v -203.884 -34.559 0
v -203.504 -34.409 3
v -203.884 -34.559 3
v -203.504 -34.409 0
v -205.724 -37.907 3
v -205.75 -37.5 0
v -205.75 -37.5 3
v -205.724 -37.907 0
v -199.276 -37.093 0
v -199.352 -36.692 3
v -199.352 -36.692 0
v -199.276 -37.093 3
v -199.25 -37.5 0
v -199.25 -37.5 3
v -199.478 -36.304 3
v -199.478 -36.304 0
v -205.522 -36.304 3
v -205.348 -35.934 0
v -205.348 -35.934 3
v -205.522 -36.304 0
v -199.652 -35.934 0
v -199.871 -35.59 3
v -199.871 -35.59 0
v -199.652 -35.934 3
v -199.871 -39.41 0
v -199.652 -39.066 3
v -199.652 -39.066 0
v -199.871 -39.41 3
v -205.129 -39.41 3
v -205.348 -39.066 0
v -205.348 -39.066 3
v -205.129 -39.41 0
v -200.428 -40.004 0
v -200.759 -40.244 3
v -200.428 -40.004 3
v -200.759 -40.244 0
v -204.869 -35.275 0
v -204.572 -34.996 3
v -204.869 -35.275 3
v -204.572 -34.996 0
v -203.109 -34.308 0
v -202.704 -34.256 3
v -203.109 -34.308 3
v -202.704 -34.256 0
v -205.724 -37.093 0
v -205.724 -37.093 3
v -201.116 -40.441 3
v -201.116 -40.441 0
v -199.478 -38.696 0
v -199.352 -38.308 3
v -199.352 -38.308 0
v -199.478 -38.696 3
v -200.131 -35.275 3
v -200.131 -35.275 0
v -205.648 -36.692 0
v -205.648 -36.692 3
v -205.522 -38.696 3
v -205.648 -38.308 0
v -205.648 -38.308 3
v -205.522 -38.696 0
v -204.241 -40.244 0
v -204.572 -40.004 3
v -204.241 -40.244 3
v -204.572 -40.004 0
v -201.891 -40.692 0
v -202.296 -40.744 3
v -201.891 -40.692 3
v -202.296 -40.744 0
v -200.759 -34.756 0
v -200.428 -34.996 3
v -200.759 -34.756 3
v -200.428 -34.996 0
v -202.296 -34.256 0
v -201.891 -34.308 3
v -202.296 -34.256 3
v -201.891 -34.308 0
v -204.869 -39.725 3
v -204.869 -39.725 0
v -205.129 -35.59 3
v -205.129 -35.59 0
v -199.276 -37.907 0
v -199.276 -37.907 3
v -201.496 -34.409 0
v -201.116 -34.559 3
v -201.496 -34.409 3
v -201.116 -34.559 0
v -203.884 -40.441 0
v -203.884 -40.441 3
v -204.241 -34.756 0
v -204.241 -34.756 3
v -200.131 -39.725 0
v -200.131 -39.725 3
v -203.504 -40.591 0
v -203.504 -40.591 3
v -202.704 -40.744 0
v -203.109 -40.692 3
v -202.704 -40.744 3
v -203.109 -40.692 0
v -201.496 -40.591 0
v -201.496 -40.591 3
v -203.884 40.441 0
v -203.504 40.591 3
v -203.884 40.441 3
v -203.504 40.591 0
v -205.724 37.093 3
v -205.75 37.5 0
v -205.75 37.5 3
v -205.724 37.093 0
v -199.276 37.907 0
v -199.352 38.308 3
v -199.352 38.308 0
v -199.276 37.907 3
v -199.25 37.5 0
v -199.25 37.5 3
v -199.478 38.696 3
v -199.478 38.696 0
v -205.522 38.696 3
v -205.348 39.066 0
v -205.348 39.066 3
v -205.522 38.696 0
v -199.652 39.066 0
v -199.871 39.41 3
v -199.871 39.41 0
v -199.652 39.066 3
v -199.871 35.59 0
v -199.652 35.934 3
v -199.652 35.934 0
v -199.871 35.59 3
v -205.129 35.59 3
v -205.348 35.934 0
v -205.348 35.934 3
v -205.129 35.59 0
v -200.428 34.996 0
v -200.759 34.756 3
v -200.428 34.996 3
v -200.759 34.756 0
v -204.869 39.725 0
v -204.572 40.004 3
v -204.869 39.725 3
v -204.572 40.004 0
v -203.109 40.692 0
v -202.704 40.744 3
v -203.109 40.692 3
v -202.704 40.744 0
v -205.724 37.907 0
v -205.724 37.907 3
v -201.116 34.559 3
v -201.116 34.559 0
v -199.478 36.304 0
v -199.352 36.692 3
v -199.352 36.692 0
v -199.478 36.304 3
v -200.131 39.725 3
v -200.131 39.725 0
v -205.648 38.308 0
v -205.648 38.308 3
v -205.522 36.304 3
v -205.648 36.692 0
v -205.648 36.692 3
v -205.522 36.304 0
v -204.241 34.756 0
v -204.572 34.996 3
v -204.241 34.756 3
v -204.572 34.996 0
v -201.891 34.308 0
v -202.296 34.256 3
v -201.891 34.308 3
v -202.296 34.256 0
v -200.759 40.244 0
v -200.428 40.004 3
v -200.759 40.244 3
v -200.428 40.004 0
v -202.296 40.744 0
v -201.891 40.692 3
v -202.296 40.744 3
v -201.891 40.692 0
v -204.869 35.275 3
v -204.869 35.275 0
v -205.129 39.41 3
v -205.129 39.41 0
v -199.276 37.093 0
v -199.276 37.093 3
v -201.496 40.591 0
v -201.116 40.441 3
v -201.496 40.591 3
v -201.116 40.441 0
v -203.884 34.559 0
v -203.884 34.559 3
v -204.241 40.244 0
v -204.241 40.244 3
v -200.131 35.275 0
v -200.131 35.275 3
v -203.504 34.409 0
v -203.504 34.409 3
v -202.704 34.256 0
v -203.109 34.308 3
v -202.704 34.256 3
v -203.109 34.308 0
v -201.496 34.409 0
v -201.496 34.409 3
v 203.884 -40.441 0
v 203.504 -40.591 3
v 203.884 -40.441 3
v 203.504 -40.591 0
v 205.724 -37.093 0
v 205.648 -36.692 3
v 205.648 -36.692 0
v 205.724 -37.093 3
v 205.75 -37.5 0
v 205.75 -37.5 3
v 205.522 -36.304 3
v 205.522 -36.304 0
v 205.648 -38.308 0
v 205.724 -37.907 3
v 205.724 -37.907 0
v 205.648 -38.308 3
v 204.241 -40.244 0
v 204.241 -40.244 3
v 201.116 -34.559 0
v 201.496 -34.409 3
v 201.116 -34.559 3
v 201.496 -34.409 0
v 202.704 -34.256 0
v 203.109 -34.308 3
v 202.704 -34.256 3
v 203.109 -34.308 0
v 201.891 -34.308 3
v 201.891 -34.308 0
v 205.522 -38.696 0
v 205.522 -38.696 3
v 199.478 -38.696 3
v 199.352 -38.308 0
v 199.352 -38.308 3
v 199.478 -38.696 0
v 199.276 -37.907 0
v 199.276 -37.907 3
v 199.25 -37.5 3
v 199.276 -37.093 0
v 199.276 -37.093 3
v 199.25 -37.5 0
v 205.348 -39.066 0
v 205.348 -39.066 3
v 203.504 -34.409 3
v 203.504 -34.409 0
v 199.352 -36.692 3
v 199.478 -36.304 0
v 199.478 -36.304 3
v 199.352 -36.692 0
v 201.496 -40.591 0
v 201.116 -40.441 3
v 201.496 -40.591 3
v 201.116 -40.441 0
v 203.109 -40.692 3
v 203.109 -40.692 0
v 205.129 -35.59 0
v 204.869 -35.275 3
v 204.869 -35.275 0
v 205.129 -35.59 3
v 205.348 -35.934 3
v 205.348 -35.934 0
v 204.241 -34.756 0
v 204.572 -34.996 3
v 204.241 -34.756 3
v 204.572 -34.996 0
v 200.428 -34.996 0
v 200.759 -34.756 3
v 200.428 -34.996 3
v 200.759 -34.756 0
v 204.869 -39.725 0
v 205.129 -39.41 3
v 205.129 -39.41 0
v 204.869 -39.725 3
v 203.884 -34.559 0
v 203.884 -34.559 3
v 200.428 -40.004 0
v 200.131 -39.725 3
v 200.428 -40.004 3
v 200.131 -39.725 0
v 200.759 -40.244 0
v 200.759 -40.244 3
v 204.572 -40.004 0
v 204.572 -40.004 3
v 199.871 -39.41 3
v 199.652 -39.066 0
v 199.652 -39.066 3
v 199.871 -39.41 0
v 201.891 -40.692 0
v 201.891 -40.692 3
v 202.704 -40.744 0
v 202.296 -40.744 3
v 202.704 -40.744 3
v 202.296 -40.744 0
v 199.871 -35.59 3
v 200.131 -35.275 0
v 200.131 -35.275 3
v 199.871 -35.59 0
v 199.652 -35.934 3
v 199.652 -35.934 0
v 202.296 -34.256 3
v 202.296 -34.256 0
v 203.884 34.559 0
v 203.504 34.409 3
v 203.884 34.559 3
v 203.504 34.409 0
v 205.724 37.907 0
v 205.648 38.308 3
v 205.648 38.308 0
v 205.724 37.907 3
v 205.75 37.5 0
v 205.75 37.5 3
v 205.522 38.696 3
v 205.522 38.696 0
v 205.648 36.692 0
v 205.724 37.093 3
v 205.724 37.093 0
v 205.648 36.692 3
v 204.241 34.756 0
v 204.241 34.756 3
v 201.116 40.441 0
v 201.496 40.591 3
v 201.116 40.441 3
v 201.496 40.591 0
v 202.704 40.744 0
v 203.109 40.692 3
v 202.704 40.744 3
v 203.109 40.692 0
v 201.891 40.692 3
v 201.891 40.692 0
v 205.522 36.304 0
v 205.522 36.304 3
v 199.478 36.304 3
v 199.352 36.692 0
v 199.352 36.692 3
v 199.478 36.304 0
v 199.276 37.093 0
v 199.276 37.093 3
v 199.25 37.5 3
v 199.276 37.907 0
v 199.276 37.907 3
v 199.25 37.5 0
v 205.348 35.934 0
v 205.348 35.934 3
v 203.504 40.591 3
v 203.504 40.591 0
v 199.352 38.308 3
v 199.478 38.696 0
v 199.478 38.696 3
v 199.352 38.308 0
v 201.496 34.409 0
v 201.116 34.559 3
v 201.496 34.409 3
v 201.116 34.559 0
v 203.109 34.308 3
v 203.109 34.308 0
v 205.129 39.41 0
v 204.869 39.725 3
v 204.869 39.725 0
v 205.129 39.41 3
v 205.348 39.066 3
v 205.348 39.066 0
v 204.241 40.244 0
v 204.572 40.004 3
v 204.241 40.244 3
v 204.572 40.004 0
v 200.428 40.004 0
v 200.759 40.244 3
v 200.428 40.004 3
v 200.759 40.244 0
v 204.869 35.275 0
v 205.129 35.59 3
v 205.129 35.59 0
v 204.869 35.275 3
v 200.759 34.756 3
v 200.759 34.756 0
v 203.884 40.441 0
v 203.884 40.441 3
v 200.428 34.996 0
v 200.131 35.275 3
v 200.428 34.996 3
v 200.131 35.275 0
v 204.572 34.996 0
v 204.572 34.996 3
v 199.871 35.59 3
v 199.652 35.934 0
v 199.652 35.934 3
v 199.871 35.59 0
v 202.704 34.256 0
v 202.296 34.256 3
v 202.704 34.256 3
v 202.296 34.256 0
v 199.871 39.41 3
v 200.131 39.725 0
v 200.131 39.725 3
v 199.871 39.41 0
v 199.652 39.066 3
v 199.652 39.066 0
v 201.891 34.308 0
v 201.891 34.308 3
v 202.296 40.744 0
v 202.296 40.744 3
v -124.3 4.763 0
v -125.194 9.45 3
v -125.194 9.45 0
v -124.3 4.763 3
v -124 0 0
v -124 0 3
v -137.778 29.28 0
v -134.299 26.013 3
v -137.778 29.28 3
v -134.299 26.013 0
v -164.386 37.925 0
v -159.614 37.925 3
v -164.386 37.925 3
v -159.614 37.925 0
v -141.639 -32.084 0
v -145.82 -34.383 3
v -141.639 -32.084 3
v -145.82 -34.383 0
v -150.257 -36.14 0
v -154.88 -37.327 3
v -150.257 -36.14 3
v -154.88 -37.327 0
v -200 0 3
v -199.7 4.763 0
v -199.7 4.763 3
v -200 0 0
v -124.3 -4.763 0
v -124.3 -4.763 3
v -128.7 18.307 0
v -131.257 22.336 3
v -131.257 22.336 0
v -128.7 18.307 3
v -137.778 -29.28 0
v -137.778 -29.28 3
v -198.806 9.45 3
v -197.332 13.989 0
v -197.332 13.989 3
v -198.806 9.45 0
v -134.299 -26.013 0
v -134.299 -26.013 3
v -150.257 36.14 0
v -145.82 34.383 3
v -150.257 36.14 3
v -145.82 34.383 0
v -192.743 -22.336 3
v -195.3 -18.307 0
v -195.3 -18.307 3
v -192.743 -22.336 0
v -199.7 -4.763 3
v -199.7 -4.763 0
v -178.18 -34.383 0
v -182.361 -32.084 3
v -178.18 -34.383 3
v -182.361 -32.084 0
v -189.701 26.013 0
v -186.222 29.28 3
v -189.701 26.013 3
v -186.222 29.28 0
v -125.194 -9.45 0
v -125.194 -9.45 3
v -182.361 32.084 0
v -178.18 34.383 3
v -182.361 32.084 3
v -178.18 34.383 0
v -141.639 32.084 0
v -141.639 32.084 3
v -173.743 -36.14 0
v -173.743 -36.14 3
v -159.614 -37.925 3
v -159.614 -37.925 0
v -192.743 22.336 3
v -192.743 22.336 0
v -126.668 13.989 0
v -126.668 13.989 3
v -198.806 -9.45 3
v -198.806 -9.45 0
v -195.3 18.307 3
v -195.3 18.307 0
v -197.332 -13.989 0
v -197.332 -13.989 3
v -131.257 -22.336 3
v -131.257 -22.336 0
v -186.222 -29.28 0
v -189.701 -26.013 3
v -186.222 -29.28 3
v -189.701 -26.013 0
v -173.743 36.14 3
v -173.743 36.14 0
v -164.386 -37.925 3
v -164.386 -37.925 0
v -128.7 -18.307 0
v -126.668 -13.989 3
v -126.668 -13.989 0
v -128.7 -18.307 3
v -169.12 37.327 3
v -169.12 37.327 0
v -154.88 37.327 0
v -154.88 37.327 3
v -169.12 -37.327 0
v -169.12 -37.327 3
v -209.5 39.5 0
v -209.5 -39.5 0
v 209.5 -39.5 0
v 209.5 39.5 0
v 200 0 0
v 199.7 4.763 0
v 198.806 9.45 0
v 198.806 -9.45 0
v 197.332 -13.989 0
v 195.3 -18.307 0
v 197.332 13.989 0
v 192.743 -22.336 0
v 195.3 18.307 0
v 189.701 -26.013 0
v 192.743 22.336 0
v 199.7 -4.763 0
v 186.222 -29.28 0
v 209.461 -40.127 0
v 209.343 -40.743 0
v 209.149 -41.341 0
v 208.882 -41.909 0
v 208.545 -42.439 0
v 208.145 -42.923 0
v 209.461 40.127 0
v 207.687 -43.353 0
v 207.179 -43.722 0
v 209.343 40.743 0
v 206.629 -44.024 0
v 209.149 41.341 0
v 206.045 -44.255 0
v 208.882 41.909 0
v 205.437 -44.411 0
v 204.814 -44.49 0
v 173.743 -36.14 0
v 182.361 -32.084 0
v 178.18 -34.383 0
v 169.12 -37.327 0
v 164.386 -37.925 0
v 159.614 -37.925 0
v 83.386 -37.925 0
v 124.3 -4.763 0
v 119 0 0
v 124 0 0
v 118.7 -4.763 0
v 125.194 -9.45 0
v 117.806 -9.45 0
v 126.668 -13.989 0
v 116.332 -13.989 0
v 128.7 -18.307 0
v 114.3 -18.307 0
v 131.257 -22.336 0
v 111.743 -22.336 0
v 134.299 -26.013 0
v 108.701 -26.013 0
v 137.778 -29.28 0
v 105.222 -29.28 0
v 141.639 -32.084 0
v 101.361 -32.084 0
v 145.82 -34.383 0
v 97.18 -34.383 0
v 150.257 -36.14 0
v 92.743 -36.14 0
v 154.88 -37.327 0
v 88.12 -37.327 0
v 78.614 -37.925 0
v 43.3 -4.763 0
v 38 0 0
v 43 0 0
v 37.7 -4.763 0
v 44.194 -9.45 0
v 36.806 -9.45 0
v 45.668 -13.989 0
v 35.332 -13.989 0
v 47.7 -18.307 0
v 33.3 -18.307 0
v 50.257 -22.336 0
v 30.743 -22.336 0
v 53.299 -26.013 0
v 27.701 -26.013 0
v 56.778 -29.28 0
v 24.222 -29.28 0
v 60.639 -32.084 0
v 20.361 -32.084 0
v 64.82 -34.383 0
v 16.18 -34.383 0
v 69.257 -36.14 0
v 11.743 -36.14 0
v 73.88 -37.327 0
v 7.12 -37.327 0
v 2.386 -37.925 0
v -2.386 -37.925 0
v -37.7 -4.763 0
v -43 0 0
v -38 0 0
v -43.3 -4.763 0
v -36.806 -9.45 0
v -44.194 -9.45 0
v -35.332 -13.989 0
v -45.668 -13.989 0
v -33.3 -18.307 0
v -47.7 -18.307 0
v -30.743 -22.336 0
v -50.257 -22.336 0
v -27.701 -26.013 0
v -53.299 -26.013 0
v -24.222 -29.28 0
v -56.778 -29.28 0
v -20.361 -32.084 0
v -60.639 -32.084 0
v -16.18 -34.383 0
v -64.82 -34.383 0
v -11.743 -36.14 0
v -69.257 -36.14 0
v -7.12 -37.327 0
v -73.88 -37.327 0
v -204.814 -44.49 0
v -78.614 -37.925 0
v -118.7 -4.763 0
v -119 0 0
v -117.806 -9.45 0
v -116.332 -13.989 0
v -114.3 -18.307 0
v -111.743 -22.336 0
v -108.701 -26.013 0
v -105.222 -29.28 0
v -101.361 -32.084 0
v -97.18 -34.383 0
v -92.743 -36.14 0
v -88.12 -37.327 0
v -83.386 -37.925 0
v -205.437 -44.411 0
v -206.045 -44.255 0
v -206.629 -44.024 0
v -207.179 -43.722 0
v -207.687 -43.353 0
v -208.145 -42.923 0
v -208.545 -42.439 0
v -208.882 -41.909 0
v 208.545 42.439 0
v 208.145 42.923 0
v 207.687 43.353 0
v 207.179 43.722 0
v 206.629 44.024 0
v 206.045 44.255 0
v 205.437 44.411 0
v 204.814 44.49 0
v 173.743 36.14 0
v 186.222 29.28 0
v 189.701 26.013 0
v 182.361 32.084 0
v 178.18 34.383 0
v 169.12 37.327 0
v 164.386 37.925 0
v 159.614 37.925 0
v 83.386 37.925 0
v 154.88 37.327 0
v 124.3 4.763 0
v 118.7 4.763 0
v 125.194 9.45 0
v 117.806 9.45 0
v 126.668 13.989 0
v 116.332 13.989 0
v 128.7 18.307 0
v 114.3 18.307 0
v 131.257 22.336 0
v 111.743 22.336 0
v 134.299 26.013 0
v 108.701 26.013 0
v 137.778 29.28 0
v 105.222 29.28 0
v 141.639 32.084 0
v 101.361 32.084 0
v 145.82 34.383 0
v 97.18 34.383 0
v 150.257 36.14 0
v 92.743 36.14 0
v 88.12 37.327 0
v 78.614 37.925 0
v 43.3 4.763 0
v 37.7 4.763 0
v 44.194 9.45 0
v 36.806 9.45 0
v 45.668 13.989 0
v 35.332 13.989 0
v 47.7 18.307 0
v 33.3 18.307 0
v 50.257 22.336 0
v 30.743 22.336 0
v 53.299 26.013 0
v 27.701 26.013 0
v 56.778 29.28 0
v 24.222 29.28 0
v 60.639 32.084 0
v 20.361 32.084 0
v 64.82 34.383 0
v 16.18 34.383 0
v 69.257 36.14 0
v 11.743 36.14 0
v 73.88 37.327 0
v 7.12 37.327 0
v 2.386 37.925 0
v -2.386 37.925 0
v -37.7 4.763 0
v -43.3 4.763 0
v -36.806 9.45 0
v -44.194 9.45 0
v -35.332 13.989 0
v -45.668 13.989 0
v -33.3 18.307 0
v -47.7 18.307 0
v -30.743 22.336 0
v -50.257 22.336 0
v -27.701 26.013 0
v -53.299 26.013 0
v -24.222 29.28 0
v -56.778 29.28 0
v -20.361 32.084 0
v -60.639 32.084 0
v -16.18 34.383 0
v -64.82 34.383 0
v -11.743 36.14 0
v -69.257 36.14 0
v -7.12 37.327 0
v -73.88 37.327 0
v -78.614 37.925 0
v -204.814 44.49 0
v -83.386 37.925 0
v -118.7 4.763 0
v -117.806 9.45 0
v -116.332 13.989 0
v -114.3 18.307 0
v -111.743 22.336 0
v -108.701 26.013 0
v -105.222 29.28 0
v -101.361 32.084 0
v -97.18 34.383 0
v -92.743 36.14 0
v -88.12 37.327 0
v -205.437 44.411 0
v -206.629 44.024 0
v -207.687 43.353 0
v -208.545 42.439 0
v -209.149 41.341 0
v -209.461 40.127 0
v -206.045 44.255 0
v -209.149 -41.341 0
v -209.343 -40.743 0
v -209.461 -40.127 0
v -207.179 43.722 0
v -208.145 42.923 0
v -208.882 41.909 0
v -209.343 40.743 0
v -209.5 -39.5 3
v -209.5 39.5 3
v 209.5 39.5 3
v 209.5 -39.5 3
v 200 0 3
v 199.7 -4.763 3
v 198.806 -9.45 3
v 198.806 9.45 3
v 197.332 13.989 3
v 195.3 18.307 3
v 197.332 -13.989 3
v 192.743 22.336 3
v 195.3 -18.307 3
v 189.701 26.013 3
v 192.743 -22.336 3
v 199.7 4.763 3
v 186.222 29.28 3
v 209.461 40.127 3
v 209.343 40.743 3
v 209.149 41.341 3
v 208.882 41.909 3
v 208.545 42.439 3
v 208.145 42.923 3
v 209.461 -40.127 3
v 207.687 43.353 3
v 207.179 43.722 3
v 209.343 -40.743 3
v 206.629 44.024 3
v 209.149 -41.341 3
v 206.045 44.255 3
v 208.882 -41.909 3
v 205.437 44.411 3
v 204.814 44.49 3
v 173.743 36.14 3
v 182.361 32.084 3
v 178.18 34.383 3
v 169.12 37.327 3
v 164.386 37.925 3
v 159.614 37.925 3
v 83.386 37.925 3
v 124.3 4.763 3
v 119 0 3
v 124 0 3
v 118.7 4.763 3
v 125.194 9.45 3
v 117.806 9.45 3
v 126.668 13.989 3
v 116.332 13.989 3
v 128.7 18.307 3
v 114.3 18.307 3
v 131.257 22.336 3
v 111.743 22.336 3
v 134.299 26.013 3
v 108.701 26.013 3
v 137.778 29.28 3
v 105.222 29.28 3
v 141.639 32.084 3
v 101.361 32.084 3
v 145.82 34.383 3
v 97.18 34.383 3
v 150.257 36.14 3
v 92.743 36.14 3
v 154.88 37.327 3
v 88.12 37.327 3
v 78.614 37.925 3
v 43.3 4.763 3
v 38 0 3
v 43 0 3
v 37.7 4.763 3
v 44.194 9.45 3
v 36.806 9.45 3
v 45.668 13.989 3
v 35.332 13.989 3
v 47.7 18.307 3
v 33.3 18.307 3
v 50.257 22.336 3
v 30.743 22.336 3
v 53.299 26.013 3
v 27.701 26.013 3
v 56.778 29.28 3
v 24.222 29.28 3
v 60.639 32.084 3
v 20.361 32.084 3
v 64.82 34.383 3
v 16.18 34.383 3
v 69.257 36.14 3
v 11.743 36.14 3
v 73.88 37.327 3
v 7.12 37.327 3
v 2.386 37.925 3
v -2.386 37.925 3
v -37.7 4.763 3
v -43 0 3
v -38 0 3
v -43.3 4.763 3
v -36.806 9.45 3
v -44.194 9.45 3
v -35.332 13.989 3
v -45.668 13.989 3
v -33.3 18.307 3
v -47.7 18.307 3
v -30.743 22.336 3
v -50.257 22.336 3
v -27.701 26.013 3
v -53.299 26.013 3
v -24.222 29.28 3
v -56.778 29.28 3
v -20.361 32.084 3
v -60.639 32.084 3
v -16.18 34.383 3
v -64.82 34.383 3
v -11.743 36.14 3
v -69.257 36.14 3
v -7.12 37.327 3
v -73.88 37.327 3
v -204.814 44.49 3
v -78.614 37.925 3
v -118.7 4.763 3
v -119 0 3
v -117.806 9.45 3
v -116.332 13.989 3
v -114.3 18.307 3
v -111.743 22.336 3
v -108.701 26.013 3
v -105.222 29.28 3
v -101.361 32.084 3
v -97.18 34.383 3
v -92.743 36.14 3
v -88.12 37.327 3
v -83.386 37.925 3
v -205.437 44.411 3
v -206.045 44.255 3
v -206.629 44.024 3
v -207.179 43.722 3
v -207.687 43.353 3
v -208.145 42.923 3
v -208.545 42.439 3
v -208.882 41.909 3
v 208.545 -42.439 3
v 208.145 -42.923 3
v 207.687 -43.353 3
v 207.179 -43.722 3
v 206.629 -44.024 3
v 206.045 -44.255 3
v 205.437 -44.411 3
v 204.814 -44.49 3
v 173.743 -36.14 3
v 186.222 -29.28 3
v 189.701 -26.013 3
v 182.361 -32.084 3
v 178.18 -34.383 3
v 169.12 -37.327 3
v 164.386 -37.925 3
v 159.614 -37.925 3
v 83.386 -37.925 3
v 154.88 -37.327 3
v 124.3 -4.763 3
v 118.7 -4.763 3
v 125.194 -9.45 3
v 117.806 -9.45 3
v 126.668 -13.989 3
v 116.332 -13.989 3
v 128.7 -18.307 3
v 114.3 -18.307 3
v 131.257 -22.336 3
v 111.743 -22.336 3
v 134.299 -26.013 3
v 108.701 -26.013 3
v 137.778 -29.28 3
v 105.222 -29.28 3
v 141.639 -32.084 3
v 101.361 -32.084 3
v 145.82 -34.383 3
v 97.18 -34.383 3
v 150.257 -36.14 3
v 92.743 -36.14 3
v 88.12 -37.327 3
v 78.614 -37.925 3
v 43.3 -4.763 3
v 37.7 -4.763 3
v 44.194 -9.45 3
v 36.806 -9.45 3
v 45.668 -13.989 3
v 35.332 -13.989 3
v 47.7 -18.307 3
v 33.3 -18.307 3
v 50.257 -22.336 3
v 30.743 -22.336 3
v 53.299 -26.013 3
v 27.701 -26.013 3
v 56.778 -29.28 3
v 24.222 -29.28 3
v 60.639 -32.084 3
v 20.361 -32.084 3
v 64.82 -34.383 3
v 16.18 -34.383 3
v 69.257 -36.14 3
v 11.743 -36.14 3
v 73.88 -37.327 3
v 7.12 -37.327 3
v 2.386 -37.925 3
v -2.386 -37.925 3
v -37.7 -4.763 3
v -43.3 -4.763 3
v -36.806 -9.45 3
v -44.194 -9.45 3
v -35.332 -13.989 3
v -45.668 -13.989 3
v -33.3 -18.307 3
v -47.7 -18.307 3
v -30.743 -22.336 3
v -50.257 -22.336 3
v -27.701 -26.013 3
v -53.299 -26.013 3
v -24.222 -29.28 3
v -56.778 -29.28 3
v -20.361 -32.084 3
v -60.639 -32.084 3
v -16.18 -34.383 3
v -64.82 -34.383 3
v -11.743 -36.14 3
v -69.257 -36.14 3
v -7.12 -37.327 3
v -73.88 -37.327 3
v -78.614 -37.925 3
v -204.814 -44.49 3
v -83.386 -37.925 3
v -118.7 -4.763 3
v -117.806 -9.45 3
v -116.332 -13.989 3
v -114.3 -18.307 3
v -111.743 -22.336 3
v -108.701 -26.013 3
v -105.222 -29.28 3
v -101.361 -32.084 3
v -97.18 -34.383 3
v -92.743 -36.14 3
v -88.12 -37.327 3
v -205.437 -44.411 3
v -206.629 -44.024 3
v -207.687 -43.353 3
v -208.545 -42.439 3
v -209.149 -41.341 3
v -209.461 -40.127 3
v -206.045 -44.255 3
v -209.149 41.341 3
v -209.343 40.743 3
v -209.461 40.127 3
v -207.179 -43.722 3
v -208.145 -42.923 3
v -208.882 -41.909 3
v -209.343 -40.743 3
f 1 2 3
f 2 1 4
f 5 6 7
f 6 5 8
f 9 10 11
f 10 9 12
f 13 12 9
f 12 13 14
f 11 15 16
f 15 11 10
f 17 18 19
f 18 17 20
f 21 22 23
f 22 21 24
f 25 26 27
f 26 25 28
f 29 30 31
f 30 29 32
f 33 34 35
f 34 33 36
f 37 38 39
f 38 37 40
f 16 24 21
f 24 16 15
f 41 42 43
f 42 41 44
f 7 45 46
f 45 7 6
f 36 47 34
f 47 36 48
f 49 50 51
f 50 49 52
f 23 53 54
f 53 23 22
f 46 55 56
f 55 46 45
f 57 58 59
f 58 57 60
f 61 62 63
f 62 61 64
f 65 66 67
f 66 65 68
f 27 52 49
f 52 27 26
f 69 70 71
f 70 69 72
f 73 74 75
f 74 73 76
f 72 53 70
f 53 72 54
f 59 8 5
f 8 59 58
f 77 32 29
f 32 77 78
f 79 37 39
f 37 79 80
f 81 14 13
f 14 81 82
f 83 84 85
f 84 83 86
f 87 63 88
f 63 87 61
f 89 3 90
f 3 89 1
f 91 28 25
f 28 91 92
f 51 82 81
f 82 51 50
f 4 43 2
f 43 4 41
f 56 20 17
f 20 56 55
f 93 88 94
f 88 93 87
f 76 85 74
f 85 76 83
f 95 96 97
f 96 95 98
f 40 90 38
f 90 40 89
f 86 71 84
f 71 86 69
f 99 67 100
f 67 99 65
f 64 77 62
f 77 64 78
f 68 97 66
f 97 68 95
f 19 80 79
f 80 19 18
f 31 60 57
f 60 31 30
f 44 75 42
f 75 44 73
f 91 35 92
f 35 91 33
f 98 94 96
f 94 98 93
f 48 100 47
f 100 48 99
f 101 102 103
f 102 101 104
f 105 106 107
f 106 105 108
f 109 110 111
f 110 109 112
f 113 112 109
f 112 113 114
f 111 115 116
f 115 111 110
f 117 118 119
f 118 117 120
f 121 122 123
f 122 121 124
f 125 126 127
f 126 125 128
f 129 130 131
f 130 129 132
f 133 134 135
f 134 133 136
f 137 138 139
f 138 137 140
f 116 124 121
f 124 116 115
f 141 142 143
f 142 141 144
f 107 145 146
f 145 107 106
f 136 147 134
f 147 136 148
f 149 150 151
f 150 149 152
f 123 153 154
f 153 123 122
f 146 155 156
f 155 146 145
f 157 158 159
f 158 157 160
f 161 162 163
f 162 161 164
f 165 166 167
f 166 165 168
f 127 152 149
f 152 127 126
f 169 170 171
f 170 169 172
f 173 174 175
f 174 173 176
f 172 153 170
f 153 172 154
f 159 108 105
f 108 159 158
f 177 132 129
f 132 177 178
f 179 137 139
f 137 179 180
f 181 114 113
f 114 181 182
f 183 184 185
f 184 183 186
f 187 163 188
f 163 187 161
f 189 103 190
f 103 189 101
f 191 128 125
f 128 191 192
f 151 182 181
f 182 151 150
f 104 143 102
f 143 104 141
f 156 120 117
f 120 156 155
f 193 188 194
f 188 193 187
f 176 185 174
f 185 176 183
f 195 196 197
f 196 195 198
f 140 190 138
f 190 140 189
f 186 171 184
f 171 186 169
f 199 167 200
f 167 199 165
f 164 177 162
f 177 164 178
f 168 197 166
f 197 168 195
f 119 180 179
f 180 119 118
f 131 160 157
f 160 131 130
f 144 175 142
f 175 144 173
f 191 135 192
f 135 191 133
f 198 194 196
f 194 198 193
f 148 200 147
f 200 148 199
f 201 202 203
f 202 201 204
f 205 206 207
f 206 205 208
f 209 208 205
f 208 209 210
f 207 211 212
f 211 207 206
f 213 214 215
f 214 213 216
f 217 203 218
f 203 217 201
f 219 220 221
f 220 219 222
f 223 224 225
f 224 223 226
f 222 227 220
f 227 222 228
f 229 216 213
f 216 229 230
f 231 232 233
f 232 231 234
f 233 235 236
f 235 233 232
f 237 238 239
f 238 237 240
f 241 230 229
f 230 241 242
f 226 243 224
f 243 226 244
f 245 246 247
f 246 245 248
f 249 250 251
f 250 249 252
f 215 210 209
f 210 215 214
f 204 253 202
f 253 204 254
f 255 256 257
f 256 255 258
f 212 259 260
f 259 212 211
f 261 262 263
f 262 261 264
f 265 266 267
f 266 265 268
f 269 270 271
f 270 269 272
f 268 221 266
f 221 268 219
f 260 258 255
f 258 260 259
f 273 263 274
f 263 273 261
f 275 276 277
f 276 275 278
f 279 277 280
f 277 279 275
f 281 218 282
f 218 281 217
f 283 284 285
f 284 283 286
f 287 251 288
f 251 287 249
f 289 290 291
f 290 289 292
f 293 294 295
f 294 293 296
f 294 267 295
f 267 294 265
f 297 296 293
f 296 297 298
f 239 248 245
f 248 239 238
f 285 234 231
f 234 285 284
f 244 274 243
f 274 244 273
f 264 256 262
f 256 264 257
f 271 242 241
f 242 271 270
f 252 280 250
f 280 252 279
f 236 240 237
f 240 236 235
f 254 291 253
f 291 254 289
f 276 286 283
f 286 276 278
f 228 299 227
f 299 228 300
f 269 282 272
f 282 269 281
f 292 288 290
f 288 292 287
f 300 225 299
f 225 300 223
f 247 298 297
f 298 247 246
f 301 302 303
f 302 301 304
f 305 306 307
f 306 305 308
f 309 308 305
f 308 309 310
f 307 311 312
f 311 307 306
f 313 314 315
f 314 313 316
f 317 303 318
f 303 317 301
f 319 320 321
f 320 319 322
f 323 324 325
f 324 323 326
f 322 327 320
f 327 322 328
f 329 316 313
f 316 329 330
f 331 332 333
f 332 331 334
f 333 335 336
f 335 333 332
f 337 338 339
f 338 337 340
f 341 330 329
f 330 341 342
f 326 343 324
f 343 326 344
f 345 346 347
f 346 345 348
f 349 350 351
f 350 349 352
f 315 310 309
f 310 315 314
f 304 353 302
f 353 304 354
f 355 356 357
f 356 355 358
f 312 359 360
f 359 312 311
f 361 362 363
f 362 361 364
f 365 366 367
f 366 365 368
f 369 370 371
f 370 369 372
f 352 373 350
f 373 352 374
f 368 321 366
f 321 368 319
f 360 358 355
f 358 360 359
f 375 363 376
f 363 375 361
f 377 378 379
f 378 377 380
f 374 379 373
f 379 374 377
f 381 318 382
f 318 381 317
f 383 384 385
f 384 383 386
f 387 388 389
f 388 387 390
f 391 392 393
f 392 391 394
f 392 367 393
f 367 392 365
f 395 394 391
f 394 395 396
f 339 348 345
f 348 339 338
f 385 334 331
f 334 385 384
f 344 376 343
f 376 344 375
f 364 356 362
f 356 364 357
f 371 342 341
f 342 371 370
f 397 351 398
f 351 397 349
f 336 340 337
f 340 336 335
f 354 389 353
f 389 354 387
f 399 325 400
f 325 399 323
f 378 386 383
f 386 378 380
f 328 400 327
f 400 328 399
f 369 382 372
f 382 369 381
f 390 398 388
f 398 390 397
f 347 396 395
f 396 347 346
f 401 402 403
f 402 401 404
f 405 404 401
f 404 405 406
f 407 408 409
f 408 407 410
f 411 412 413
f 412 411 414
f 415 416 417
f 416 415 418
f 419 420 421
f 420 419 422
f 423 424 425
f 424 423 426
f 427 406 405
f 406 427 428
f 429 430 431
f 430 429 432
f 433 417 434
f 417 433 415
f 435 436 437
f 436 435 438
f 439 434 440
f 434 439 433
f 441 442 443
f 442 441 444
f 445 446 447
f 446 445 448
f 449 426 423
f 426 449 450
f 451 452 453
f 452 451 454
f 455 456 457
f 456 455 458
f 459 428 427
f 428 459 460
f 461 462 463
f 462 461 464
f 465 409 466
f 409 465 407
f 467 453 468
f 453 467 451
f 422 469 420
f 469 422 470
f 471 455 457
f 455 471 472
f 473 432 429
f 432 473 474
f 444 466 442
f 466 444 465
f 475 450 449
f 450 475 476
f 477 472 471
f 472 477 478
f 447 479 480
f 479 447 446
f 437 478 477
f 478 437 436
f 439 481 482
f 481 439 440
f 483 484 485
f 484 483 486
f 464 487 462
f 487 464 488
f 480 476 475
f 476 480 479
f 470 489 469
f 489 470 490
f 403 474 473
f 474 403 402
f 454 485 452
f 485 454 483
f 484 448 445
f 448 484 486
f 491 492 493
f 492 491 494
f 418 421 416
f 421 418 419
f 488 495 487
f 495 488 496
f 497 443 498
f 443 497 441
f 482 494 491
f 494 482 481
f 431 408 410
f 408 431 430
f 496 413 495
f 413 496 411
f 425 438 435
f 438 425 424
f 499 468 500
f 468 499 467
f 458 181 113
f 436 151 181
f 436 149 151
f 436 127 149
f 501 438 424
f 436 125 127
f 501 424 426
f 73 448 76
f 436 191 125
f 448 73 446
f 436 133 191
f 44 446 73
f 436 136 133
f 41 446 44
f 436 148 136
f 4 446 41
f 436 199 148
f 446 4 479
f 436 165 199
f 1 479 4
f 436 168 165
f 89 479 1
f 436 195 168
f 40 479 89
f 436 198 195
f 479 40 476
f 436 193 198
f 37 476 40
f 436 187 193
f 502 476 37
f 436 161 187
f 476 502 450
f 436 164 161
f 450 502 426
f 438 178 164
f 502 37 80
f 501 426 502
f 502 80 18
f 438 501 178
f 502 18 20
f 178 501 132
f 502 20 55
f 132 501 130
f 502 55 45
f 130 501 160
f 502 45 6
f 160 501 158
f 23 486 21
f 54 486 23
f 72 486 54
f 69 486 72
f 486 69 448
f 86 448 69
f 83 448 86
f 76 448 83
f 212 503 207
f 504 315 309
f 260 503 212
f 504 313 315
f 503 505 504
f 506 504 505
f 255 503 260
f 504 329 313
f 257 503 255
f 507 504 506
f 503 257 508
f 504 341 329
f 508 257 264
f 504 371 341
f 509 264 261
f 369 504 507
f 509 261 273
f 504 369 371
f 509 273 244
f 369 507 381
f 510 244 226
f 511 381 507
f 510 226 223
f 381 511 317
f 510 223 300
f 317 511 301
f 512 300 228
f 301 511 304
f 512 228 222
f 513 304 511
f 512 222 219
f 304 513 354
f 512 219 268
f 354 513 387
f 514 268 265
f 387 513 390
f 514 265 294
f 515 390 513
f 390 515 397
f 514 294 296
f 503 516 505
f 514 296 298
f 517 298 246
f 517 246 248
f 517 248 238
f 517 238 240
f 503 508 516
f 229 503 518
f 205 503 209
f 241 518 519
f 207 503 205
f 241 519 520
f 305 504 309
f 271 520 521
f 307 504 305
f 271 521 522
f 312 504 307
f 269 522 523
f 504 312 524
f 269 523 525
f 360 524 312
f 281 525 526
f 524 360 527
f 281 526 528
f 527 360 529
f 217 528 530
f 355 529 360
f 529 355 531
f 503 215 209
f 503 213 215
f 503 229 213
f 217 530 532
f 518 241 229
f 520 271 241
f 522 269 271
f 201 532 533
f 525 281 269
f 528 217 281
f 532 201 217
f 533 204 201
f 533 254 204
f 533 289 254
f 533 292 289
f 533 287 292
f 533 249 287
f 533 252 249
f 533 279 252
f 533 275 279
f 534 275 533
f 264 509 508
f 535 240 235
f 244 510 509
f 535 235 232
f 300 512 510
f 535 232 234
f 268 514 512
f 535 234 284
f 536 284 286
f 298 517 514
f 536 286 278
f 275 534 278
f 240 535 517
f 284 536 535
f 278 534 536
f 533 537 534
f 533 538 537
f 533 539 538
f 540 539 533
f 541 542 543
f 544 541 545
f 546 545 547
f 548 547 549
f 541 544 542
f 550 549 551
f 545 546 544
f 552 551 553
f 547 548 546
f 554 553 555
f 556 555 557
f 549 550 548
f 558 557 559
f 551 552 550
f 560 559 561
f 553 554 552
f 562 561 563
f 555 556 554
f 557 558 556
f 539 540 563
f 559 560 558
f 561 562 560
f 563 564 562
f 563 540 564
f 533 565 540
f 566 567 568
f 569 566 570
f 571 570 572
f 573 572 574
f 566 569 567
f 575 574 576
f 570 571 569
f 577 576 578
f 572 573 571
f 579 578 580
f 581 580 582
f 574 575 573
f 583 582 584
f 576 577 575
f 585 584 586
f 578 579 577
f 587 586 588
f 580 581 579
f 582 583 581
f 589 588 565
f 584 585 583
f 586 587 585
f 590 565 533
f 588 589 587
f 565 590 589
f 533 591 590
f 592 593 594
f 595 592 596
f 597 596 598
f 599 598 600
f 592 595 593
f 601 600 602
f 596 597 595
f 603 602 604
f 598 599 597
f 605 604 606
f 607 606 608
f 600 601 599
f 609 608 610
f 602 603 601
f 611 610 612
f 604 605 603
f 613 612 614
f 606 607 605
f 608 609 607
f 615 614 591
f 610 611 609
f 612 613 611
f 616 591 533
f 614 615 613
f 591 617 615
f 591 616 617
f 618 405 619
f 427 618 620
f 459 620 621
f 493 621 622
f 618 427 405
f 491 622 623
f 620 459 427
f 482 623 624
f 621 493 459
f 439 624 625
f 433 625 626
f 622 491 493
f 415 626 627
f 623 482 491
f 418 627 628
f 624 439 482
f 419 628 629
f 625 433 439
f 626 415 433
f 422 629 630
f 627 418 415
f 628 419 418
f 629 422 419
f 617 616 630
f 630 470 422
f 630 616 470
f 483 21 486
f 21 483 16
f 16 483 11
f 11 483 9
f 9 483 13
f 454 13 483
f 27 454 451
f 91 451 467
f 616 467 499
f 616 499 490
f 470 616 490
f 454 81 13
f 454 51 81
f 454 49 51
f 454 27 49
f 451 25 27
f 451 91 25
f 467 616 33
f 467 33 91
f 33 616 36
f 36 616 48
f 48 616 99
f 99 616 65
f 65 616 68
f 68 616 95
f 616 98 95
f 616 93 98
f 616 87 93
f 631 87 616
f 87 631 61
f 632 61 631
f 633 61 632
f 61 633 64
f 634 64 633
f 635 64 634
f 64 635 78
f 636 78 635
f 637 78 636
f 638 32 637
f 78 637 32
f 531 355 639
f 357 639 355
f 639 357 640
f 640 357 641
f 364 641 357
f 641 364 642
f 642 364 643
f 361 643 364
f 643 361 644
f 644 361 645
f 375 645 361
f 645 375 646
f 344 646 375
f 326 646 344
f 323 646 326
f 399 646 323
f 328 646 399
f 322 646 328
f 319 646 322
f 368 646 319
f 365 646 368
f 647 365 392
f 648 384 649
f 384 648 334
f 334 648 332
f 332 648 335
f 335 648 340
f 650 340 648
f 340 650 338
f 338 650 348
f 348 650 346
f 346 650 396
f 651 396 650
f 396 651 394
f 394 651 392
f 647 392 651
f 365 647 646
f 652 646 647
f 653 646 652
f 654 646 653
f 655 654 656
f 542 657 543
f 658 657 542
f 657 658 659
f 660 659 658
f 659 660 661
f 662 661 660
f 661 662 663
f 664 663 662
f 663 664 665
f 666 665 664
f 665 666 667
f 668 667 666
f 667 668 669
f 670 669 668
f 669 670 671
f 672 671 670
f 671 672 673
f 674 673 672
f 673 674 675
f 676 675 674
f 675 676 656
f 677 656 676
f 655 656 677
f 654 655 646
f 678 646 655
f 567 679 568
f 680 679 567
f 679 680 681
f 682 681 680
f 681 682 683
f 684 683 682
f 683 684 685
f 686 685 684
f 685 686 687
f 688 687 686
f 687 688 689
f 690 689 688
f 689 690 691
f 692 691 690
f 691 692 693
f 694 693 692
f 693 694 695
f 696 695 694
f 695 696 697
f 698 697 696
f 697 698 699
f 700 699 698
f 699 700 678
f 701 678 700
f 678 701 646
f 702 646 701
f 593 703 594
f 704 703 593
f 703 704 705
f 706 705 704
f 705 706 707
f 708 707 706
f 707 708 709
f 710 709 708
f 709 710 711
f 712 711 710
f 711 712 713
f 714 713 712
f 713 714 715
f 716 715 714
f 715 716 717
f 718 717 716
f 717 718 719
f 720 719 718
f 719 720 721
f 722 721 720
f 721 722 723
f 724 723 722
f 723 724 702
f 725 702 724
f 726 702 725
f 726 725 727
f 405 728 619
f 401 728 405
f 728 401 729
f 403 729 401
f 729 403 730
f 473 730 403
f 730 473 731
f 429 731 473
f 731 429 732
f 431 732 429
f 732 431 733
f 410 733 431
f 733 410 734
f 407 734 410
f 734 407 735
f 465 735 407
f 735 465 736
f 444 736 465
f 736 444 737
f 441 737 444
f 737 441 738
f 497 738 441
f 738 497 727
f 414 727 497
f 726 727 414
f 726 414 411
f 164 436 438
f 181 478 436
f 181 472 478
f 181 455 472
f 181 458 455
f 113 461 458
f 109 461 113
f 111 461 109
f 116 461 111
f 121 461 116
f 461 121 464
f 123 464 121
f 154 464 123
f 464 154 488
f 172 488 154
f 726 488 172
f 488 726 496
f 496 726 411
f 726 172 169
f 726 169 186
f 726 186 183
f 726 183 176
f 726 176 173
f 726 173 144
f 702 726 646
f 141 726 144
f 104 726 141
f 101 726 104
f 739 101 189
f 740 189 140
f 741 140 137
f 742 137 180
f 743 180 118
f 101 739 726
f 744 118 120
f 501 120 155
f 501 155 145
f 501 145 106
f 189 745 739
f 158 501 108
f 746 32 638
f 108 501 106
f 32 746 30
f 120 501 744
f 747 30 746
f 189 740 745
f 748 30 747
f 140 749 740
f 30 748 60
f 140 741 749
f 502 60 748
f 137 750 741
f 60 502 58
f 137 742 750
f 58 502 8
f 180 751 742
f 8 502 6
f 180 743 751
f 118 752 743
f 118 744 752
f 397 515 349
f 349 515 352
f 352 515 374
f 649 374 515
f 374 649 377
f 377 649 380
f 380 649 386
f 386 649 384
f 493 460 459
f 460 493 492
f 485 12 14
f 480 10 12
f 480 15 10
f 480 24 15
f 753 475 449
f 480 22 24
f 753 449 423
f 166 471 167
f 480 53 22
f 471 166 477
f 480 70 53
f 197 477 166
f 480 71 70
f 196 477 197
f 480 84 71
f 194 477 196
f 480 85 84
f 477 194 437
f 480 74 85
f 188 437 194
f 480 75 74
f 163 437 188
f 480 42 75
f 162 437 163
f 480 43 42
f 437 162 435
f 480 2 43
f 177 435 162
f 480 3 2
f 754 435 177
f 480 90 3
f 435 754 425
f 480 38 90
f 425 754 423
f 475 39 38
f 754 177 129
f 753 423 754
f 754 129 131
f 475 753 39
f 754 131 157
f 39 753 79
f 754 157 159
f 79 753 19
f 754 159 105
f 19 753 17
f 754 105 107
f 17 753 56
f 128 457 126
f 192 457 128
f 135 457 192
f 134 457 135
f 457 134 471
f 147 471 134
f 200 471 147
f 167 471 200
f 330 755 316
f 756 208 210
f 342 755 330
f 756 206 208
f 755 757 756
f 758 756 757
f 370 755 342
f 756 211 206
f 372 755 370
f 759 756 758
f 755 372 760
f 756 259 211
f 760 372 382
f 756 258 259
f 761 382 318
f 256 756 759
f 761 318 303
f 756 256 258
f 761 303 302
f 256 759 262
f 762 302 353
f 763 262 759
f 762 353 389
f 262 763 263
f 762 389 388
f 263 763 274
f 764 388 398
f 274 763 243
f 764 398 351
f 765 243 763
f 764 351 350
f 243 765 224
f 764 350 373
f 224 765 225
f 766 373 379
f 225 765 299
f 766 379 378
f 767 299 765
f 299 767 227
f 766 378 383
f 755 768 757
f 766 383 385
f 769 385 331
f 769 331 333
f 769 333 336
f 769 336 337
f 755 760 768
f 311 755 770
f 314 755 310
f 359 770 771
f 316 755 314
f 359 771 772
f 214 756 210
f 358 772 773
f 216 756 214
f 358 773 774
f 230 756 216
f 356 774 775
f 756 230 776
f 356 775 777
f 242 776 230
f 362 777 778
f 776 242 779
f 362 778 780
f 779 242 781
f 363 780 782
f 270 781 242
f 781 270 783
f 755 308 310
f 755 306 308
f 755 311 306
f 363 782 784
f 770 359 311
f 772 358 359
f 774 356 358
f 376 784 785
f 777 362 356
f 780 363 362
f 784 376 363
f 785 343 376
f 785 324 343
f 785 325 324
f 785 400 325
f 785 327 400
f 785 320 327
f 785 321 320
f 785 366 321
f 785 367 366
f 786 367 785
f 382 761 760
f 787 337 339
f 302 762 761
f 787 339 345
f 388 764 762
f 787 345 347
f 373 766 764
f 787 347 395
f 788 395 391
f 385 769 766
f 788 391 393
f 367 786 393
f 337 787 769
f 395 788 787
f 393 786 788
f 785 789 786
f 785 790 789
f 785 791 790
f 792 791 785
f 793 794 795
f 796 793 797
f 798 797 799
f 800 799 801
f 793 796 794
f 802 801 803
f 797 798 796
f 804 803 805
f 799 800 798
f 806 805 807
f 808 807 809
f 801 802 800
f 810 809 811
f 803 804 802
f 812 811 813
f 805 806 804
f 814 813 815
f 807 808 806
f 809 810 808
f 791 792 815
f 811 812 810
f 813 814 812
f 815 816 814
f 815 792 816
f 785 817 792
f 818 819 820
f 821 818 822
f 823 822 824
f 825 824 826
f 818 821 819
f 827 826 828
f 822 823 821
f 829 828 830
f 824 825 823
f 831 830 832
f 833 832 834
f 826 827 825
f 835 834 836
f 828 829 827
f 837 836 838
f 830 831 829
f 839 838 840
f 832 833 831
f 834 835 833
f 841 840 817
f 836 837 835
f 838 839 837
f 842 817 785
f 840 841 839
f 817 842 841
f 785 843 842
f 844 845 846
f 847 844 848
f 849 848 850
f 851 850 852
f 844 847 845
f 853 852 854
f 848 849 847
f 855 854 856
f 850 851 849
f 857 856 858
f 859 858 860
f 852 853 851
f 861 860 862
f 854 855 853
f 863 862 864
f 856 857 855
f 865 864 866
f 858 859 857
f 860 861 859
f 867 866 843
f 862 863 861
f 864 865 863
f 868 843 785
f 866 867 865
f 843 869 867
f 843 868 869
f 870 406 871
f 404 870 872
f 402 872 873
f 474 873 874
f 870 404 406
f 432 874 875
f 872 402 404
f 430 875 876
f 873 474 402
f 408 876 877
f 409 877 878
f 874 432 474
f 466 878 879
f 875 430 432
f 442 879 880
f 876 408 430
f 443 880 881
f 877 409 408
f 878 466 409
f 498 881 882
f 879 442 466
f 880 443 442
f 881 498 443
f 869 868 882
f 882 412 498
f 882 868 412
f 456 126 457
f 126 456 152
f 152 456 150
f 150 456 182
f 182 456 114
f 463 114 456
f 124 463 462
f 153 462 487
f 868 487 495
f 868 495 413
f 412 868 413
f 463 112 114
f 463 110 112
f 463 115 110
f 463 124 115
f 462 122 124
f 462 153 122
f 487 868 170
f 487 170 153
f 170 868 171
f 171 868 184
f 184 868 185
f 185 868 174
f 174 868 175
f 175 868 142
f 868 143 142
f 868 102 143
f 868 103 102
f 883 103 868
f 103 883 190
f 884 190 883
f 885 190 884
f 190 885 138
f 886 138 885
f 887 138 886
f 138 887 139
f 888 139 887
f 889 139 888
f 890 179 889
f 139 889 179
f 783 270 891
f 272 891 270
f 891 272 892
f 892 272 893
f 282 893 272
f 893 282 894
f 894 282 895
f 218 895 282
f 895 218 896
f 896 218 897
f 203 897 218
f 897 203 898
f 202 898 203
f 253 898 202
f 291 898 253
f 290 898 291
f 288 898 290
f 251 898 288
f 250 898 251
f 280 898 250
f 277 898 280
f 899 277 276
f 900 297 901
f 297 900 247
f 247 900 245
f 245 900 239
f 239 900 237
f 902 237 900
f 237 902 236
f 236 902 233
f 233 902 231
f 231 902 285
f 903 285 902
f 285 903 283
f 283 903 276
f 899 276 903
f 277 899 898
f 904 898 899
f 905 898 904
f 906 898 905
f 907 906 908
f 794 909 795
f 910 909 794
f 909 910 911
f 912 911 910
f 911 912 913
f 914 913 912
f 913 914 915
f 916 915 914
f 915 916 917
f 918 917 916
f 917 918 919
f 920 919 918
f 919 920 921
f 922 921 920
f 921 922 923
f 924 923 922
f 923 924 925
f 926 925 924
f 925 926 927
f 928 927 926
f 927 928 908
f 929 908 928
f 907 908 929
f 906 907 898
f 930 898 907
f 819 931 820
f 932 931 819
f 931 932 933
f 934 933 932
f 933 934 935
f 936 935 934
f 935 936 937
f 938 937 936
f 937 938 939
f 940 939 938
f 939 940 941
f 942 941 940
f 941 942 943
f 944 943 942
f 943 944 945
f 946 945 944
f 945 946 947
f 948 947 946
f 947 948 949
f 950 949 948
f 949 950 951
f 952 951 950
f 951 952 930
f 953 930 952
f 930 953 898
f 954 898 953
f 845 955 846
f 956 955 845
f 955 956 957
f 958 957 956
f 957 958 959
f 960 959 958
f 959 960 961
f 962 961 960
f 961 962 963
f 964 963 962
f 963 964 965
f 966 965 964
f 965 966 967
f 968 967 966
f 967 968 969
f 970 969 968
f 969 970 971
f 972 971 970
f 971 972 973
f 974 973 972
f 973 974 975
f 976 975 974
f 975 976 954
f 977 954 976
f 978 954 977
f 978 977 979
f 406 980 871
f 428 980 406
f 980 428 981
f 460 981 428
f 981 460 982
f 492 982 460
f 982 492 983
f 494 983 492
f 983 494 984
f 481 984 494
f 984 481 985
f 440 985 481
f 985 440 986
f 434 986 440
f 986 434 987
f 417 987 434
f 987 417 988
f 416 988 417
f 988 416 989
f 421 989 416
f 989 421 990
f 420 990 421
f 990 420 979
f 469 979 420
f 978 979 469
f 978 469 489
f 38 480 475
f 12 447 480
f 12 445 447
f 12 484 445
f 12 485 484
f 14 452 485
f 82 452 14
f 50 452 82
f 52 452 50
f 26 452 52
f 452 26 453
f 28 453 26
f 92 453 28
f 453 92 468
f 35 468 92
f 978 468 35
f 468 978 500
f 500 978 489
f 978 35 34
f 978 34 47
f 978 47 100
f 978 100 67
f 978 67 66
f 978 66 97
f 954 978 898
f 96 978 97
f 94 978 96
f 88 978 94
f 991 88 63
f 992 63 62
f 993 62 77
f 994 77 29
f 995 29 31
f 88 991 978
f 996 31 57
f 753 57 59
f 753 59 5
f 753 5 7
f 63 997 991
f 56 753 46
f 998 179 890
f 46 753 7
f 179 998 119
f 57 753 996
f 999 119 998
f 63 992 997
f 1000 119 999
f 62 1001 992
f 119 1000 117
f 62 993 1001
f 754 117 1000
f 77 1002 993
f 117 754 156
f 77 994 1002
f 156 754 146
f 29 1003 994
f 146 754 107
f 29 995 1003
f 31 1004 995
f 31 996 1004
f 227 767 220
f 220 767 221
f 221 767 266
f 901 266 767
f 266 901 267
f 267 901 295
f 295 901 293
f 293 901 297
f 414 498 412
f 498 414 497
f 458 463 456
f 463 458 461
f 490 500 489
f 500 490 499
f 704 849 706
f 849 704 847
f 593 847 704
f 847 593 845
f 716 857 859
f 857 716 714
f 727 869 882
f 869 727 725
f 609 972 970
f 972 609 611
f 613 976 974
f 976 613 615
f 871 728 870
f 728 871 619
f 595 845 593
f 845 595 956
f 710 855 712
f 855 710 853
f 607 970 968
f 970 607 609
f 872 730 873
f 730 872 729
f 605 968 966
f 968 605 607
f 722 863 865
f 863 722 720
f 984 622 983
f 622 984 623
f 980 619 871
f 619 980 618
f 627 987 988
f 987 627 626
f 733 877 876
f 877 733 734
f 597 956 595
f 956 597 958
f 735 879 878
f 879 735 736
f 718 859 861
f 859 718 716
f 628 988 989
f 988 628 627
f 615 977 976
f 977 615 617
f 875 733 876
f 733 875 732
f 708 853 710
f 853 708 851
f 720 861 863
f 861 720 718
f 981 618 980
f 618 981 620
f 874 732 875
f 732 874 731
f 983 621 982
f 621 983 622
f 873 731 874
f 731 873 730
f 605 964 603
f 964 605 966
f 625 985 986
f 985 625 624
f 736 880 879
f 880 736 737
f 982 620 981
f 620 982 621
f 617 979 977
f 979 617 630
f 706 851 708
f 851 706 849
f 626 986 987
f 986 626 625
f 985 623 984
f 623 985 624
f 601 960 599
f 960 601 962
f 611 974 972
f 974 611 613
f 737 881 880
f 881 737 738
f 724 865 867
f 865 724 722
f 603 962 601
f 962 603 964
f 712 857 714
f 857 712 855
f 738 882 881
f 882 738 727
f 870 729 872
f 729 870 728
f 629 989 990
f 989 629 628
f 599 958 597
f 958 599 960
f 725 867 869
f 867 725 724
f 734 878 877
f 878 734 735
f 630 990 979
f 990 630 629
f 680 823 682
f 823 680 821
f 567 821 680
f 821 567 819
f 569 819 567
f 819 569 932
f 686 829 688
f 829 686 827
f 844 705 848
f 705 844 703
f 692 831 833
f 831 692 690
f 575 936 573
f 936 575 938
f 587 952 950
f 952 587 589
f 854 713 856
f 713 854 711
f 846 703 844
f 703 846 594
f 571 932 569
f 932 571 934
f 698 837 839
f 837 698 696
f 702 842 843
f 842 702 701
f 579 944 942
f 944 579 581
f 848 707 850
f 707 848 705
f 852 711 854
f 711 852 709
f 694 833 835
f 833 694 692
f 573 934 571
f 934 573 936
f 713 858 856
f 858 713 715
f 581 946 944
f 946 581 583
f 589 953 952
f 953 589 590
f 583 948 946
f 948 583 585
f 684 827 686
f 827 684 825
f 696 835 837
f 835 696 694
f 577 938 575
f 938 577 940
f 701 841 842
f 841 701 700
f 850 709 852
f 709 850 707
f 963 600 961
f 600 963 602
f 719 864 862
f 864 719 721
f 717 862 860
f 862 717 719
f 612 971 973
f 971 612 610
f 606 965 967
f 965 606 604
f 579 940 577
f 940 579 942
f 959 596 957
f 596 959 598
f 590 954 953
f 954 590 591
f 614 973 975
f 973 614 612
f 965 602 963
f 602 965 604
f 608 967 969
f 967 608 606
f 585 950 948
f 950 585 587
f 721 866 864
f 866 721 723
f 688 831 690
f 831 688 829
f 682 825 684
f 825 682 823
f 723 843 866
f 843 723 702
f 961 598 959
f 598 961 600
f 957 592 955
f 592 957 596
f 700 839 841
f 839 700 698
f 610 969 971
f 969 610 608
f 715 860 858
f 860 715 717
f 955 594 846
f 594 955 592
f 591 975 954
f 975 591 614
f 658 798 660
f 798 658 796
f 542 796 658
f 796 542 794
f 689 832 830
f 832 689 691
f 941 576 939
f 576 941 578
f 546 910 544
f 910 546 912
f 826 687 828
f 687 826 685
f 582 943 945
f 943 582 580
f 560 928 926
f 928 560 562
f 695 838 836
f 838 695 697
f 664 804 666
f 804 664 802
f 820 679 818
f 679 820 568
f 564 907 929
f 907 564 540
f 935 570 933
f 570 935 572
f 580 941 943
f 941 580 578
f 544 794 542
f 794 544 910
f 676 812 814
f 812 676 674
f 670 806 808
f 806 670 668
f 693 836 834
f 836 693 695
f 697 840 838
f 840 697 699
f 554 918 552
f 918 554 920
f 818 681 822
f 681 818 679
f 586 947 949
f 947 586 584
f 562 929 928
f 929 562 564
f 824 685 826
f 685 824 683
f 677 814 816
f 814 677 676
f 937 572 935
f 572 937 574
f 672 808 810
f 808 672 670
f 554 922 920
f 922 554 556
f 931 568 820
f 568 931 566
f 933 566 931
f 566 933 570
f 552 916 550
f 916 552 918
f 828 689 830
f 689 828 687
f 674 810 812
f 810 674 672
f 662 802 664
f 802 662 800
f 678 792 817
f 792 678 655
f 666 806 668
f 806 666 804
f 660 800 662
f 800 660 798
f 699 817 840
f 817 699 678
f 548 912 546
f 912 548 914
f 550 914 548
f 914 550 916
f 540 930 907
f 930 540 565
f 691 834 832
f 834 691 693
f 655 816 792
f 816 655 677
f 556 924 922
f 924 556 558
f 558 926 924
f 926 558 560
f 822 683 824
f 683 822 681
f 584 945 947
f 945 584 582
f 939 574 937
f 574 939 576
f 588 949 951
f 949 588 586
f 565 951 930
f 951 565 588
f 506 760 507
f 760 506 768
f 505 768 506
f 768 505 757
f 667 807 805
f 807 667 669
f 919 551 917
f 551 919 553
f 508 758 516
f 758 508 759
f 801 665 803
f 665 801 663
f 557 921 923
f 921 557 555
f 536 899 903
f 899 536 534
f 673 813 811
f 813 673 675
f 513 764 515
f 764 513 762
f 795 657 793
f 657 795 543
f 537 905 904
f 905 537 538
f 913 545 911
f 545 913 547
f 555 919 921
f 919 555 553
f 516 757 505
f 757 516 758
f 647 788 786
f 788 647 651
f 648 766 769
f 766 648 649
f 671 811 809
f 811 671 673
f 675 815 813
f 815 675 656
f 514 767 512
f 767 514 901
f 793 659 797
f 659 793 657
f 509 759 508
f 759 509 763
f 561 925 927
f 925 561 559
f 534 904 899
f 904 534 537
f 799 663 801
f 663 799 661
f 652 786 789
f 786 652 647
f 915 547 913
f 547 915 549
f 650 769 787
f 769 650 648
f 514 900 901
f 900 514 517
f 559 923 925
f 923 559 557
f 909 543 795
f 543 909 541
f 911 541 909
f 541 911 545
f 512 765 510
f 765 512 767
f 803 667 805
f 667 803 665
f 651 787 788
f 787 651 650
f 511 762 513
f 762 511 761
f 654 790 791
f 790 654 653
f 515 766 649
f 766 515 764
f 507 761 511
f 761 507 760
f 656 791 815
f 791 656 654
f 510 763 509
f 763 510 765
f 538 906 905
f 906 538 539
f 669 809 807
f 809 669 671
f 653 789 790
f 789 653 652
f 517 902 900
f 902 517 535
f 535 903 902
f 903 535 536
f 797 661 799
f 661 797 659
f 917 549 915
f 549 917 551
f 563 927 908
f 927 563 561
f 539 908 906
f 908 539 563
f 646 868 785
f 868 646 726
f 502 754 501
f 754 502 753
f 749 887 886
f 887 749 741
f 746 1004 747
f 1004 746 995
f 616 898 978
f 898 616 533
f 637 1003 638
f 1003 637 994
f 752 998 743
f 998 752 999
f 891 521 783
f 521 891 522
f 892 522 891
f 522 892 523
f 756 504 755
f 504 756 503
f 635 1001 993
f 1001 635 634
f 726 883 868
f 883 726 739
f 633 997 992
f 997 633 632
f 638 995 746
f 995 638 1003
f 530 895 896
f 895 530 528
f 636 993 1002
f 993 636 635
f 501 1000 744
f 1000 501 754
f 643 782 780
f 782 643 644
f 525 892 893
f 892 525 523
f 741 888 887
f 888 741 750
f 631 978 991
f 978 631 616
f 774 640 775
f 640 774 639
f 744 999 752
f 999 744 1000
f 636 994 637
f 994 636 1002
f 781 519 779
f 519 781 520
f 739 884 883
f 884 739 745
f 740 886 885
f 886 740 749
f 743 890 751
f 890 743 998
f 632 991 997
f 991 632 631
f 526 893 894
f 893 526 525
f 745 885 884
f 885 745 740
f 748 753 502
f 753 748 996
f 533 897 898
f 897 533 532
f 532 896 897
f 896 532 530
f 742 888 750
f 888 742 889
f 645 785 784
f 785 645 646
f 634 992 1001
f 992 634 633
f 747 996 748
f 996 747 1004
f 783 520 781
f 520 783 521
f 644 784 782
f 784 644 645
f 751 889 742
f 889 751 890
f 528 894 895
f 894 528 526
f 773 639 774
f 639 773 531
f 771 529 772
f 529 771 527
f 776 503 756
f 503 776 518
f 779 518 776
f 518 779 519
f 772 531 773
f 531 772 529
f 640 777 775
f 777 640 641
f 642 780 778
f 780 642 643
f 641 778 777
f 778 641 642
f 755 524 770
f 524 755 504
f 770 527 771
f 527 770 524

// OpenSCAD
$fn = 50;


difference() {
	union() {
		hull() {
			translate(v = [-204.5000000000, 39.5000000000, 0]) {
				cylinder(h = 3, r = 5);
			}
			translate(v = [204.5000000000, 39.5000000000, 0]) {
				cylinder(h = 3, r = 5);
			}
			translate(v = [-204.5000000000, -39.5000000000, 0]) {
				cylinder(h = 3, r = 5);
			}
			translate(v = [204.5000000000, -39.5000000000, 0]) {
				cylinder(h = 3, r = 5);
			}
		}
	}
	union() {
		#translate(v = [-202.5000000000, -37.5000000000, -100.0000000000]) {
			cylinder(h = 200, r = 3.2500000000);
		}
		#translate(v = [-202.5000000000, 37.5000000000, -100.0000000000]) {
			cylinder(h = 200, r = 3.2500000000);
		}
		#translate(v = [202.5000000000, -37.5000000000, -100.0000000000]) {
			cylinder(h = 200, r = 3.2500000000);
		}
		#translate(v = [202.5000000000, 37.5000000000, -100.0000000000]) {
			cylinder(h = 200, r = 3.2500000000);
		}
		#translate(v = [-162.0000000000, 0, 0]) {
			cylinder(h = 3, r = 38.0000000000);
		}
		#translate(v = [-81.0000000000, 0, 0]) {
			cylinder(h = 3, r = 38.0000000000);
		}
		#cylinder(h = 3, r = 38.0000000000);
		#translate(v = [81.0000000000, 0, 0]) {
			cylinder(h = 3, r = 38.0000000000);
		}
		#translate(v = [162.0000000000, 0, 0]) {
			cylinder(h = 3, r = 38.0000000000);
		}
	}
}
